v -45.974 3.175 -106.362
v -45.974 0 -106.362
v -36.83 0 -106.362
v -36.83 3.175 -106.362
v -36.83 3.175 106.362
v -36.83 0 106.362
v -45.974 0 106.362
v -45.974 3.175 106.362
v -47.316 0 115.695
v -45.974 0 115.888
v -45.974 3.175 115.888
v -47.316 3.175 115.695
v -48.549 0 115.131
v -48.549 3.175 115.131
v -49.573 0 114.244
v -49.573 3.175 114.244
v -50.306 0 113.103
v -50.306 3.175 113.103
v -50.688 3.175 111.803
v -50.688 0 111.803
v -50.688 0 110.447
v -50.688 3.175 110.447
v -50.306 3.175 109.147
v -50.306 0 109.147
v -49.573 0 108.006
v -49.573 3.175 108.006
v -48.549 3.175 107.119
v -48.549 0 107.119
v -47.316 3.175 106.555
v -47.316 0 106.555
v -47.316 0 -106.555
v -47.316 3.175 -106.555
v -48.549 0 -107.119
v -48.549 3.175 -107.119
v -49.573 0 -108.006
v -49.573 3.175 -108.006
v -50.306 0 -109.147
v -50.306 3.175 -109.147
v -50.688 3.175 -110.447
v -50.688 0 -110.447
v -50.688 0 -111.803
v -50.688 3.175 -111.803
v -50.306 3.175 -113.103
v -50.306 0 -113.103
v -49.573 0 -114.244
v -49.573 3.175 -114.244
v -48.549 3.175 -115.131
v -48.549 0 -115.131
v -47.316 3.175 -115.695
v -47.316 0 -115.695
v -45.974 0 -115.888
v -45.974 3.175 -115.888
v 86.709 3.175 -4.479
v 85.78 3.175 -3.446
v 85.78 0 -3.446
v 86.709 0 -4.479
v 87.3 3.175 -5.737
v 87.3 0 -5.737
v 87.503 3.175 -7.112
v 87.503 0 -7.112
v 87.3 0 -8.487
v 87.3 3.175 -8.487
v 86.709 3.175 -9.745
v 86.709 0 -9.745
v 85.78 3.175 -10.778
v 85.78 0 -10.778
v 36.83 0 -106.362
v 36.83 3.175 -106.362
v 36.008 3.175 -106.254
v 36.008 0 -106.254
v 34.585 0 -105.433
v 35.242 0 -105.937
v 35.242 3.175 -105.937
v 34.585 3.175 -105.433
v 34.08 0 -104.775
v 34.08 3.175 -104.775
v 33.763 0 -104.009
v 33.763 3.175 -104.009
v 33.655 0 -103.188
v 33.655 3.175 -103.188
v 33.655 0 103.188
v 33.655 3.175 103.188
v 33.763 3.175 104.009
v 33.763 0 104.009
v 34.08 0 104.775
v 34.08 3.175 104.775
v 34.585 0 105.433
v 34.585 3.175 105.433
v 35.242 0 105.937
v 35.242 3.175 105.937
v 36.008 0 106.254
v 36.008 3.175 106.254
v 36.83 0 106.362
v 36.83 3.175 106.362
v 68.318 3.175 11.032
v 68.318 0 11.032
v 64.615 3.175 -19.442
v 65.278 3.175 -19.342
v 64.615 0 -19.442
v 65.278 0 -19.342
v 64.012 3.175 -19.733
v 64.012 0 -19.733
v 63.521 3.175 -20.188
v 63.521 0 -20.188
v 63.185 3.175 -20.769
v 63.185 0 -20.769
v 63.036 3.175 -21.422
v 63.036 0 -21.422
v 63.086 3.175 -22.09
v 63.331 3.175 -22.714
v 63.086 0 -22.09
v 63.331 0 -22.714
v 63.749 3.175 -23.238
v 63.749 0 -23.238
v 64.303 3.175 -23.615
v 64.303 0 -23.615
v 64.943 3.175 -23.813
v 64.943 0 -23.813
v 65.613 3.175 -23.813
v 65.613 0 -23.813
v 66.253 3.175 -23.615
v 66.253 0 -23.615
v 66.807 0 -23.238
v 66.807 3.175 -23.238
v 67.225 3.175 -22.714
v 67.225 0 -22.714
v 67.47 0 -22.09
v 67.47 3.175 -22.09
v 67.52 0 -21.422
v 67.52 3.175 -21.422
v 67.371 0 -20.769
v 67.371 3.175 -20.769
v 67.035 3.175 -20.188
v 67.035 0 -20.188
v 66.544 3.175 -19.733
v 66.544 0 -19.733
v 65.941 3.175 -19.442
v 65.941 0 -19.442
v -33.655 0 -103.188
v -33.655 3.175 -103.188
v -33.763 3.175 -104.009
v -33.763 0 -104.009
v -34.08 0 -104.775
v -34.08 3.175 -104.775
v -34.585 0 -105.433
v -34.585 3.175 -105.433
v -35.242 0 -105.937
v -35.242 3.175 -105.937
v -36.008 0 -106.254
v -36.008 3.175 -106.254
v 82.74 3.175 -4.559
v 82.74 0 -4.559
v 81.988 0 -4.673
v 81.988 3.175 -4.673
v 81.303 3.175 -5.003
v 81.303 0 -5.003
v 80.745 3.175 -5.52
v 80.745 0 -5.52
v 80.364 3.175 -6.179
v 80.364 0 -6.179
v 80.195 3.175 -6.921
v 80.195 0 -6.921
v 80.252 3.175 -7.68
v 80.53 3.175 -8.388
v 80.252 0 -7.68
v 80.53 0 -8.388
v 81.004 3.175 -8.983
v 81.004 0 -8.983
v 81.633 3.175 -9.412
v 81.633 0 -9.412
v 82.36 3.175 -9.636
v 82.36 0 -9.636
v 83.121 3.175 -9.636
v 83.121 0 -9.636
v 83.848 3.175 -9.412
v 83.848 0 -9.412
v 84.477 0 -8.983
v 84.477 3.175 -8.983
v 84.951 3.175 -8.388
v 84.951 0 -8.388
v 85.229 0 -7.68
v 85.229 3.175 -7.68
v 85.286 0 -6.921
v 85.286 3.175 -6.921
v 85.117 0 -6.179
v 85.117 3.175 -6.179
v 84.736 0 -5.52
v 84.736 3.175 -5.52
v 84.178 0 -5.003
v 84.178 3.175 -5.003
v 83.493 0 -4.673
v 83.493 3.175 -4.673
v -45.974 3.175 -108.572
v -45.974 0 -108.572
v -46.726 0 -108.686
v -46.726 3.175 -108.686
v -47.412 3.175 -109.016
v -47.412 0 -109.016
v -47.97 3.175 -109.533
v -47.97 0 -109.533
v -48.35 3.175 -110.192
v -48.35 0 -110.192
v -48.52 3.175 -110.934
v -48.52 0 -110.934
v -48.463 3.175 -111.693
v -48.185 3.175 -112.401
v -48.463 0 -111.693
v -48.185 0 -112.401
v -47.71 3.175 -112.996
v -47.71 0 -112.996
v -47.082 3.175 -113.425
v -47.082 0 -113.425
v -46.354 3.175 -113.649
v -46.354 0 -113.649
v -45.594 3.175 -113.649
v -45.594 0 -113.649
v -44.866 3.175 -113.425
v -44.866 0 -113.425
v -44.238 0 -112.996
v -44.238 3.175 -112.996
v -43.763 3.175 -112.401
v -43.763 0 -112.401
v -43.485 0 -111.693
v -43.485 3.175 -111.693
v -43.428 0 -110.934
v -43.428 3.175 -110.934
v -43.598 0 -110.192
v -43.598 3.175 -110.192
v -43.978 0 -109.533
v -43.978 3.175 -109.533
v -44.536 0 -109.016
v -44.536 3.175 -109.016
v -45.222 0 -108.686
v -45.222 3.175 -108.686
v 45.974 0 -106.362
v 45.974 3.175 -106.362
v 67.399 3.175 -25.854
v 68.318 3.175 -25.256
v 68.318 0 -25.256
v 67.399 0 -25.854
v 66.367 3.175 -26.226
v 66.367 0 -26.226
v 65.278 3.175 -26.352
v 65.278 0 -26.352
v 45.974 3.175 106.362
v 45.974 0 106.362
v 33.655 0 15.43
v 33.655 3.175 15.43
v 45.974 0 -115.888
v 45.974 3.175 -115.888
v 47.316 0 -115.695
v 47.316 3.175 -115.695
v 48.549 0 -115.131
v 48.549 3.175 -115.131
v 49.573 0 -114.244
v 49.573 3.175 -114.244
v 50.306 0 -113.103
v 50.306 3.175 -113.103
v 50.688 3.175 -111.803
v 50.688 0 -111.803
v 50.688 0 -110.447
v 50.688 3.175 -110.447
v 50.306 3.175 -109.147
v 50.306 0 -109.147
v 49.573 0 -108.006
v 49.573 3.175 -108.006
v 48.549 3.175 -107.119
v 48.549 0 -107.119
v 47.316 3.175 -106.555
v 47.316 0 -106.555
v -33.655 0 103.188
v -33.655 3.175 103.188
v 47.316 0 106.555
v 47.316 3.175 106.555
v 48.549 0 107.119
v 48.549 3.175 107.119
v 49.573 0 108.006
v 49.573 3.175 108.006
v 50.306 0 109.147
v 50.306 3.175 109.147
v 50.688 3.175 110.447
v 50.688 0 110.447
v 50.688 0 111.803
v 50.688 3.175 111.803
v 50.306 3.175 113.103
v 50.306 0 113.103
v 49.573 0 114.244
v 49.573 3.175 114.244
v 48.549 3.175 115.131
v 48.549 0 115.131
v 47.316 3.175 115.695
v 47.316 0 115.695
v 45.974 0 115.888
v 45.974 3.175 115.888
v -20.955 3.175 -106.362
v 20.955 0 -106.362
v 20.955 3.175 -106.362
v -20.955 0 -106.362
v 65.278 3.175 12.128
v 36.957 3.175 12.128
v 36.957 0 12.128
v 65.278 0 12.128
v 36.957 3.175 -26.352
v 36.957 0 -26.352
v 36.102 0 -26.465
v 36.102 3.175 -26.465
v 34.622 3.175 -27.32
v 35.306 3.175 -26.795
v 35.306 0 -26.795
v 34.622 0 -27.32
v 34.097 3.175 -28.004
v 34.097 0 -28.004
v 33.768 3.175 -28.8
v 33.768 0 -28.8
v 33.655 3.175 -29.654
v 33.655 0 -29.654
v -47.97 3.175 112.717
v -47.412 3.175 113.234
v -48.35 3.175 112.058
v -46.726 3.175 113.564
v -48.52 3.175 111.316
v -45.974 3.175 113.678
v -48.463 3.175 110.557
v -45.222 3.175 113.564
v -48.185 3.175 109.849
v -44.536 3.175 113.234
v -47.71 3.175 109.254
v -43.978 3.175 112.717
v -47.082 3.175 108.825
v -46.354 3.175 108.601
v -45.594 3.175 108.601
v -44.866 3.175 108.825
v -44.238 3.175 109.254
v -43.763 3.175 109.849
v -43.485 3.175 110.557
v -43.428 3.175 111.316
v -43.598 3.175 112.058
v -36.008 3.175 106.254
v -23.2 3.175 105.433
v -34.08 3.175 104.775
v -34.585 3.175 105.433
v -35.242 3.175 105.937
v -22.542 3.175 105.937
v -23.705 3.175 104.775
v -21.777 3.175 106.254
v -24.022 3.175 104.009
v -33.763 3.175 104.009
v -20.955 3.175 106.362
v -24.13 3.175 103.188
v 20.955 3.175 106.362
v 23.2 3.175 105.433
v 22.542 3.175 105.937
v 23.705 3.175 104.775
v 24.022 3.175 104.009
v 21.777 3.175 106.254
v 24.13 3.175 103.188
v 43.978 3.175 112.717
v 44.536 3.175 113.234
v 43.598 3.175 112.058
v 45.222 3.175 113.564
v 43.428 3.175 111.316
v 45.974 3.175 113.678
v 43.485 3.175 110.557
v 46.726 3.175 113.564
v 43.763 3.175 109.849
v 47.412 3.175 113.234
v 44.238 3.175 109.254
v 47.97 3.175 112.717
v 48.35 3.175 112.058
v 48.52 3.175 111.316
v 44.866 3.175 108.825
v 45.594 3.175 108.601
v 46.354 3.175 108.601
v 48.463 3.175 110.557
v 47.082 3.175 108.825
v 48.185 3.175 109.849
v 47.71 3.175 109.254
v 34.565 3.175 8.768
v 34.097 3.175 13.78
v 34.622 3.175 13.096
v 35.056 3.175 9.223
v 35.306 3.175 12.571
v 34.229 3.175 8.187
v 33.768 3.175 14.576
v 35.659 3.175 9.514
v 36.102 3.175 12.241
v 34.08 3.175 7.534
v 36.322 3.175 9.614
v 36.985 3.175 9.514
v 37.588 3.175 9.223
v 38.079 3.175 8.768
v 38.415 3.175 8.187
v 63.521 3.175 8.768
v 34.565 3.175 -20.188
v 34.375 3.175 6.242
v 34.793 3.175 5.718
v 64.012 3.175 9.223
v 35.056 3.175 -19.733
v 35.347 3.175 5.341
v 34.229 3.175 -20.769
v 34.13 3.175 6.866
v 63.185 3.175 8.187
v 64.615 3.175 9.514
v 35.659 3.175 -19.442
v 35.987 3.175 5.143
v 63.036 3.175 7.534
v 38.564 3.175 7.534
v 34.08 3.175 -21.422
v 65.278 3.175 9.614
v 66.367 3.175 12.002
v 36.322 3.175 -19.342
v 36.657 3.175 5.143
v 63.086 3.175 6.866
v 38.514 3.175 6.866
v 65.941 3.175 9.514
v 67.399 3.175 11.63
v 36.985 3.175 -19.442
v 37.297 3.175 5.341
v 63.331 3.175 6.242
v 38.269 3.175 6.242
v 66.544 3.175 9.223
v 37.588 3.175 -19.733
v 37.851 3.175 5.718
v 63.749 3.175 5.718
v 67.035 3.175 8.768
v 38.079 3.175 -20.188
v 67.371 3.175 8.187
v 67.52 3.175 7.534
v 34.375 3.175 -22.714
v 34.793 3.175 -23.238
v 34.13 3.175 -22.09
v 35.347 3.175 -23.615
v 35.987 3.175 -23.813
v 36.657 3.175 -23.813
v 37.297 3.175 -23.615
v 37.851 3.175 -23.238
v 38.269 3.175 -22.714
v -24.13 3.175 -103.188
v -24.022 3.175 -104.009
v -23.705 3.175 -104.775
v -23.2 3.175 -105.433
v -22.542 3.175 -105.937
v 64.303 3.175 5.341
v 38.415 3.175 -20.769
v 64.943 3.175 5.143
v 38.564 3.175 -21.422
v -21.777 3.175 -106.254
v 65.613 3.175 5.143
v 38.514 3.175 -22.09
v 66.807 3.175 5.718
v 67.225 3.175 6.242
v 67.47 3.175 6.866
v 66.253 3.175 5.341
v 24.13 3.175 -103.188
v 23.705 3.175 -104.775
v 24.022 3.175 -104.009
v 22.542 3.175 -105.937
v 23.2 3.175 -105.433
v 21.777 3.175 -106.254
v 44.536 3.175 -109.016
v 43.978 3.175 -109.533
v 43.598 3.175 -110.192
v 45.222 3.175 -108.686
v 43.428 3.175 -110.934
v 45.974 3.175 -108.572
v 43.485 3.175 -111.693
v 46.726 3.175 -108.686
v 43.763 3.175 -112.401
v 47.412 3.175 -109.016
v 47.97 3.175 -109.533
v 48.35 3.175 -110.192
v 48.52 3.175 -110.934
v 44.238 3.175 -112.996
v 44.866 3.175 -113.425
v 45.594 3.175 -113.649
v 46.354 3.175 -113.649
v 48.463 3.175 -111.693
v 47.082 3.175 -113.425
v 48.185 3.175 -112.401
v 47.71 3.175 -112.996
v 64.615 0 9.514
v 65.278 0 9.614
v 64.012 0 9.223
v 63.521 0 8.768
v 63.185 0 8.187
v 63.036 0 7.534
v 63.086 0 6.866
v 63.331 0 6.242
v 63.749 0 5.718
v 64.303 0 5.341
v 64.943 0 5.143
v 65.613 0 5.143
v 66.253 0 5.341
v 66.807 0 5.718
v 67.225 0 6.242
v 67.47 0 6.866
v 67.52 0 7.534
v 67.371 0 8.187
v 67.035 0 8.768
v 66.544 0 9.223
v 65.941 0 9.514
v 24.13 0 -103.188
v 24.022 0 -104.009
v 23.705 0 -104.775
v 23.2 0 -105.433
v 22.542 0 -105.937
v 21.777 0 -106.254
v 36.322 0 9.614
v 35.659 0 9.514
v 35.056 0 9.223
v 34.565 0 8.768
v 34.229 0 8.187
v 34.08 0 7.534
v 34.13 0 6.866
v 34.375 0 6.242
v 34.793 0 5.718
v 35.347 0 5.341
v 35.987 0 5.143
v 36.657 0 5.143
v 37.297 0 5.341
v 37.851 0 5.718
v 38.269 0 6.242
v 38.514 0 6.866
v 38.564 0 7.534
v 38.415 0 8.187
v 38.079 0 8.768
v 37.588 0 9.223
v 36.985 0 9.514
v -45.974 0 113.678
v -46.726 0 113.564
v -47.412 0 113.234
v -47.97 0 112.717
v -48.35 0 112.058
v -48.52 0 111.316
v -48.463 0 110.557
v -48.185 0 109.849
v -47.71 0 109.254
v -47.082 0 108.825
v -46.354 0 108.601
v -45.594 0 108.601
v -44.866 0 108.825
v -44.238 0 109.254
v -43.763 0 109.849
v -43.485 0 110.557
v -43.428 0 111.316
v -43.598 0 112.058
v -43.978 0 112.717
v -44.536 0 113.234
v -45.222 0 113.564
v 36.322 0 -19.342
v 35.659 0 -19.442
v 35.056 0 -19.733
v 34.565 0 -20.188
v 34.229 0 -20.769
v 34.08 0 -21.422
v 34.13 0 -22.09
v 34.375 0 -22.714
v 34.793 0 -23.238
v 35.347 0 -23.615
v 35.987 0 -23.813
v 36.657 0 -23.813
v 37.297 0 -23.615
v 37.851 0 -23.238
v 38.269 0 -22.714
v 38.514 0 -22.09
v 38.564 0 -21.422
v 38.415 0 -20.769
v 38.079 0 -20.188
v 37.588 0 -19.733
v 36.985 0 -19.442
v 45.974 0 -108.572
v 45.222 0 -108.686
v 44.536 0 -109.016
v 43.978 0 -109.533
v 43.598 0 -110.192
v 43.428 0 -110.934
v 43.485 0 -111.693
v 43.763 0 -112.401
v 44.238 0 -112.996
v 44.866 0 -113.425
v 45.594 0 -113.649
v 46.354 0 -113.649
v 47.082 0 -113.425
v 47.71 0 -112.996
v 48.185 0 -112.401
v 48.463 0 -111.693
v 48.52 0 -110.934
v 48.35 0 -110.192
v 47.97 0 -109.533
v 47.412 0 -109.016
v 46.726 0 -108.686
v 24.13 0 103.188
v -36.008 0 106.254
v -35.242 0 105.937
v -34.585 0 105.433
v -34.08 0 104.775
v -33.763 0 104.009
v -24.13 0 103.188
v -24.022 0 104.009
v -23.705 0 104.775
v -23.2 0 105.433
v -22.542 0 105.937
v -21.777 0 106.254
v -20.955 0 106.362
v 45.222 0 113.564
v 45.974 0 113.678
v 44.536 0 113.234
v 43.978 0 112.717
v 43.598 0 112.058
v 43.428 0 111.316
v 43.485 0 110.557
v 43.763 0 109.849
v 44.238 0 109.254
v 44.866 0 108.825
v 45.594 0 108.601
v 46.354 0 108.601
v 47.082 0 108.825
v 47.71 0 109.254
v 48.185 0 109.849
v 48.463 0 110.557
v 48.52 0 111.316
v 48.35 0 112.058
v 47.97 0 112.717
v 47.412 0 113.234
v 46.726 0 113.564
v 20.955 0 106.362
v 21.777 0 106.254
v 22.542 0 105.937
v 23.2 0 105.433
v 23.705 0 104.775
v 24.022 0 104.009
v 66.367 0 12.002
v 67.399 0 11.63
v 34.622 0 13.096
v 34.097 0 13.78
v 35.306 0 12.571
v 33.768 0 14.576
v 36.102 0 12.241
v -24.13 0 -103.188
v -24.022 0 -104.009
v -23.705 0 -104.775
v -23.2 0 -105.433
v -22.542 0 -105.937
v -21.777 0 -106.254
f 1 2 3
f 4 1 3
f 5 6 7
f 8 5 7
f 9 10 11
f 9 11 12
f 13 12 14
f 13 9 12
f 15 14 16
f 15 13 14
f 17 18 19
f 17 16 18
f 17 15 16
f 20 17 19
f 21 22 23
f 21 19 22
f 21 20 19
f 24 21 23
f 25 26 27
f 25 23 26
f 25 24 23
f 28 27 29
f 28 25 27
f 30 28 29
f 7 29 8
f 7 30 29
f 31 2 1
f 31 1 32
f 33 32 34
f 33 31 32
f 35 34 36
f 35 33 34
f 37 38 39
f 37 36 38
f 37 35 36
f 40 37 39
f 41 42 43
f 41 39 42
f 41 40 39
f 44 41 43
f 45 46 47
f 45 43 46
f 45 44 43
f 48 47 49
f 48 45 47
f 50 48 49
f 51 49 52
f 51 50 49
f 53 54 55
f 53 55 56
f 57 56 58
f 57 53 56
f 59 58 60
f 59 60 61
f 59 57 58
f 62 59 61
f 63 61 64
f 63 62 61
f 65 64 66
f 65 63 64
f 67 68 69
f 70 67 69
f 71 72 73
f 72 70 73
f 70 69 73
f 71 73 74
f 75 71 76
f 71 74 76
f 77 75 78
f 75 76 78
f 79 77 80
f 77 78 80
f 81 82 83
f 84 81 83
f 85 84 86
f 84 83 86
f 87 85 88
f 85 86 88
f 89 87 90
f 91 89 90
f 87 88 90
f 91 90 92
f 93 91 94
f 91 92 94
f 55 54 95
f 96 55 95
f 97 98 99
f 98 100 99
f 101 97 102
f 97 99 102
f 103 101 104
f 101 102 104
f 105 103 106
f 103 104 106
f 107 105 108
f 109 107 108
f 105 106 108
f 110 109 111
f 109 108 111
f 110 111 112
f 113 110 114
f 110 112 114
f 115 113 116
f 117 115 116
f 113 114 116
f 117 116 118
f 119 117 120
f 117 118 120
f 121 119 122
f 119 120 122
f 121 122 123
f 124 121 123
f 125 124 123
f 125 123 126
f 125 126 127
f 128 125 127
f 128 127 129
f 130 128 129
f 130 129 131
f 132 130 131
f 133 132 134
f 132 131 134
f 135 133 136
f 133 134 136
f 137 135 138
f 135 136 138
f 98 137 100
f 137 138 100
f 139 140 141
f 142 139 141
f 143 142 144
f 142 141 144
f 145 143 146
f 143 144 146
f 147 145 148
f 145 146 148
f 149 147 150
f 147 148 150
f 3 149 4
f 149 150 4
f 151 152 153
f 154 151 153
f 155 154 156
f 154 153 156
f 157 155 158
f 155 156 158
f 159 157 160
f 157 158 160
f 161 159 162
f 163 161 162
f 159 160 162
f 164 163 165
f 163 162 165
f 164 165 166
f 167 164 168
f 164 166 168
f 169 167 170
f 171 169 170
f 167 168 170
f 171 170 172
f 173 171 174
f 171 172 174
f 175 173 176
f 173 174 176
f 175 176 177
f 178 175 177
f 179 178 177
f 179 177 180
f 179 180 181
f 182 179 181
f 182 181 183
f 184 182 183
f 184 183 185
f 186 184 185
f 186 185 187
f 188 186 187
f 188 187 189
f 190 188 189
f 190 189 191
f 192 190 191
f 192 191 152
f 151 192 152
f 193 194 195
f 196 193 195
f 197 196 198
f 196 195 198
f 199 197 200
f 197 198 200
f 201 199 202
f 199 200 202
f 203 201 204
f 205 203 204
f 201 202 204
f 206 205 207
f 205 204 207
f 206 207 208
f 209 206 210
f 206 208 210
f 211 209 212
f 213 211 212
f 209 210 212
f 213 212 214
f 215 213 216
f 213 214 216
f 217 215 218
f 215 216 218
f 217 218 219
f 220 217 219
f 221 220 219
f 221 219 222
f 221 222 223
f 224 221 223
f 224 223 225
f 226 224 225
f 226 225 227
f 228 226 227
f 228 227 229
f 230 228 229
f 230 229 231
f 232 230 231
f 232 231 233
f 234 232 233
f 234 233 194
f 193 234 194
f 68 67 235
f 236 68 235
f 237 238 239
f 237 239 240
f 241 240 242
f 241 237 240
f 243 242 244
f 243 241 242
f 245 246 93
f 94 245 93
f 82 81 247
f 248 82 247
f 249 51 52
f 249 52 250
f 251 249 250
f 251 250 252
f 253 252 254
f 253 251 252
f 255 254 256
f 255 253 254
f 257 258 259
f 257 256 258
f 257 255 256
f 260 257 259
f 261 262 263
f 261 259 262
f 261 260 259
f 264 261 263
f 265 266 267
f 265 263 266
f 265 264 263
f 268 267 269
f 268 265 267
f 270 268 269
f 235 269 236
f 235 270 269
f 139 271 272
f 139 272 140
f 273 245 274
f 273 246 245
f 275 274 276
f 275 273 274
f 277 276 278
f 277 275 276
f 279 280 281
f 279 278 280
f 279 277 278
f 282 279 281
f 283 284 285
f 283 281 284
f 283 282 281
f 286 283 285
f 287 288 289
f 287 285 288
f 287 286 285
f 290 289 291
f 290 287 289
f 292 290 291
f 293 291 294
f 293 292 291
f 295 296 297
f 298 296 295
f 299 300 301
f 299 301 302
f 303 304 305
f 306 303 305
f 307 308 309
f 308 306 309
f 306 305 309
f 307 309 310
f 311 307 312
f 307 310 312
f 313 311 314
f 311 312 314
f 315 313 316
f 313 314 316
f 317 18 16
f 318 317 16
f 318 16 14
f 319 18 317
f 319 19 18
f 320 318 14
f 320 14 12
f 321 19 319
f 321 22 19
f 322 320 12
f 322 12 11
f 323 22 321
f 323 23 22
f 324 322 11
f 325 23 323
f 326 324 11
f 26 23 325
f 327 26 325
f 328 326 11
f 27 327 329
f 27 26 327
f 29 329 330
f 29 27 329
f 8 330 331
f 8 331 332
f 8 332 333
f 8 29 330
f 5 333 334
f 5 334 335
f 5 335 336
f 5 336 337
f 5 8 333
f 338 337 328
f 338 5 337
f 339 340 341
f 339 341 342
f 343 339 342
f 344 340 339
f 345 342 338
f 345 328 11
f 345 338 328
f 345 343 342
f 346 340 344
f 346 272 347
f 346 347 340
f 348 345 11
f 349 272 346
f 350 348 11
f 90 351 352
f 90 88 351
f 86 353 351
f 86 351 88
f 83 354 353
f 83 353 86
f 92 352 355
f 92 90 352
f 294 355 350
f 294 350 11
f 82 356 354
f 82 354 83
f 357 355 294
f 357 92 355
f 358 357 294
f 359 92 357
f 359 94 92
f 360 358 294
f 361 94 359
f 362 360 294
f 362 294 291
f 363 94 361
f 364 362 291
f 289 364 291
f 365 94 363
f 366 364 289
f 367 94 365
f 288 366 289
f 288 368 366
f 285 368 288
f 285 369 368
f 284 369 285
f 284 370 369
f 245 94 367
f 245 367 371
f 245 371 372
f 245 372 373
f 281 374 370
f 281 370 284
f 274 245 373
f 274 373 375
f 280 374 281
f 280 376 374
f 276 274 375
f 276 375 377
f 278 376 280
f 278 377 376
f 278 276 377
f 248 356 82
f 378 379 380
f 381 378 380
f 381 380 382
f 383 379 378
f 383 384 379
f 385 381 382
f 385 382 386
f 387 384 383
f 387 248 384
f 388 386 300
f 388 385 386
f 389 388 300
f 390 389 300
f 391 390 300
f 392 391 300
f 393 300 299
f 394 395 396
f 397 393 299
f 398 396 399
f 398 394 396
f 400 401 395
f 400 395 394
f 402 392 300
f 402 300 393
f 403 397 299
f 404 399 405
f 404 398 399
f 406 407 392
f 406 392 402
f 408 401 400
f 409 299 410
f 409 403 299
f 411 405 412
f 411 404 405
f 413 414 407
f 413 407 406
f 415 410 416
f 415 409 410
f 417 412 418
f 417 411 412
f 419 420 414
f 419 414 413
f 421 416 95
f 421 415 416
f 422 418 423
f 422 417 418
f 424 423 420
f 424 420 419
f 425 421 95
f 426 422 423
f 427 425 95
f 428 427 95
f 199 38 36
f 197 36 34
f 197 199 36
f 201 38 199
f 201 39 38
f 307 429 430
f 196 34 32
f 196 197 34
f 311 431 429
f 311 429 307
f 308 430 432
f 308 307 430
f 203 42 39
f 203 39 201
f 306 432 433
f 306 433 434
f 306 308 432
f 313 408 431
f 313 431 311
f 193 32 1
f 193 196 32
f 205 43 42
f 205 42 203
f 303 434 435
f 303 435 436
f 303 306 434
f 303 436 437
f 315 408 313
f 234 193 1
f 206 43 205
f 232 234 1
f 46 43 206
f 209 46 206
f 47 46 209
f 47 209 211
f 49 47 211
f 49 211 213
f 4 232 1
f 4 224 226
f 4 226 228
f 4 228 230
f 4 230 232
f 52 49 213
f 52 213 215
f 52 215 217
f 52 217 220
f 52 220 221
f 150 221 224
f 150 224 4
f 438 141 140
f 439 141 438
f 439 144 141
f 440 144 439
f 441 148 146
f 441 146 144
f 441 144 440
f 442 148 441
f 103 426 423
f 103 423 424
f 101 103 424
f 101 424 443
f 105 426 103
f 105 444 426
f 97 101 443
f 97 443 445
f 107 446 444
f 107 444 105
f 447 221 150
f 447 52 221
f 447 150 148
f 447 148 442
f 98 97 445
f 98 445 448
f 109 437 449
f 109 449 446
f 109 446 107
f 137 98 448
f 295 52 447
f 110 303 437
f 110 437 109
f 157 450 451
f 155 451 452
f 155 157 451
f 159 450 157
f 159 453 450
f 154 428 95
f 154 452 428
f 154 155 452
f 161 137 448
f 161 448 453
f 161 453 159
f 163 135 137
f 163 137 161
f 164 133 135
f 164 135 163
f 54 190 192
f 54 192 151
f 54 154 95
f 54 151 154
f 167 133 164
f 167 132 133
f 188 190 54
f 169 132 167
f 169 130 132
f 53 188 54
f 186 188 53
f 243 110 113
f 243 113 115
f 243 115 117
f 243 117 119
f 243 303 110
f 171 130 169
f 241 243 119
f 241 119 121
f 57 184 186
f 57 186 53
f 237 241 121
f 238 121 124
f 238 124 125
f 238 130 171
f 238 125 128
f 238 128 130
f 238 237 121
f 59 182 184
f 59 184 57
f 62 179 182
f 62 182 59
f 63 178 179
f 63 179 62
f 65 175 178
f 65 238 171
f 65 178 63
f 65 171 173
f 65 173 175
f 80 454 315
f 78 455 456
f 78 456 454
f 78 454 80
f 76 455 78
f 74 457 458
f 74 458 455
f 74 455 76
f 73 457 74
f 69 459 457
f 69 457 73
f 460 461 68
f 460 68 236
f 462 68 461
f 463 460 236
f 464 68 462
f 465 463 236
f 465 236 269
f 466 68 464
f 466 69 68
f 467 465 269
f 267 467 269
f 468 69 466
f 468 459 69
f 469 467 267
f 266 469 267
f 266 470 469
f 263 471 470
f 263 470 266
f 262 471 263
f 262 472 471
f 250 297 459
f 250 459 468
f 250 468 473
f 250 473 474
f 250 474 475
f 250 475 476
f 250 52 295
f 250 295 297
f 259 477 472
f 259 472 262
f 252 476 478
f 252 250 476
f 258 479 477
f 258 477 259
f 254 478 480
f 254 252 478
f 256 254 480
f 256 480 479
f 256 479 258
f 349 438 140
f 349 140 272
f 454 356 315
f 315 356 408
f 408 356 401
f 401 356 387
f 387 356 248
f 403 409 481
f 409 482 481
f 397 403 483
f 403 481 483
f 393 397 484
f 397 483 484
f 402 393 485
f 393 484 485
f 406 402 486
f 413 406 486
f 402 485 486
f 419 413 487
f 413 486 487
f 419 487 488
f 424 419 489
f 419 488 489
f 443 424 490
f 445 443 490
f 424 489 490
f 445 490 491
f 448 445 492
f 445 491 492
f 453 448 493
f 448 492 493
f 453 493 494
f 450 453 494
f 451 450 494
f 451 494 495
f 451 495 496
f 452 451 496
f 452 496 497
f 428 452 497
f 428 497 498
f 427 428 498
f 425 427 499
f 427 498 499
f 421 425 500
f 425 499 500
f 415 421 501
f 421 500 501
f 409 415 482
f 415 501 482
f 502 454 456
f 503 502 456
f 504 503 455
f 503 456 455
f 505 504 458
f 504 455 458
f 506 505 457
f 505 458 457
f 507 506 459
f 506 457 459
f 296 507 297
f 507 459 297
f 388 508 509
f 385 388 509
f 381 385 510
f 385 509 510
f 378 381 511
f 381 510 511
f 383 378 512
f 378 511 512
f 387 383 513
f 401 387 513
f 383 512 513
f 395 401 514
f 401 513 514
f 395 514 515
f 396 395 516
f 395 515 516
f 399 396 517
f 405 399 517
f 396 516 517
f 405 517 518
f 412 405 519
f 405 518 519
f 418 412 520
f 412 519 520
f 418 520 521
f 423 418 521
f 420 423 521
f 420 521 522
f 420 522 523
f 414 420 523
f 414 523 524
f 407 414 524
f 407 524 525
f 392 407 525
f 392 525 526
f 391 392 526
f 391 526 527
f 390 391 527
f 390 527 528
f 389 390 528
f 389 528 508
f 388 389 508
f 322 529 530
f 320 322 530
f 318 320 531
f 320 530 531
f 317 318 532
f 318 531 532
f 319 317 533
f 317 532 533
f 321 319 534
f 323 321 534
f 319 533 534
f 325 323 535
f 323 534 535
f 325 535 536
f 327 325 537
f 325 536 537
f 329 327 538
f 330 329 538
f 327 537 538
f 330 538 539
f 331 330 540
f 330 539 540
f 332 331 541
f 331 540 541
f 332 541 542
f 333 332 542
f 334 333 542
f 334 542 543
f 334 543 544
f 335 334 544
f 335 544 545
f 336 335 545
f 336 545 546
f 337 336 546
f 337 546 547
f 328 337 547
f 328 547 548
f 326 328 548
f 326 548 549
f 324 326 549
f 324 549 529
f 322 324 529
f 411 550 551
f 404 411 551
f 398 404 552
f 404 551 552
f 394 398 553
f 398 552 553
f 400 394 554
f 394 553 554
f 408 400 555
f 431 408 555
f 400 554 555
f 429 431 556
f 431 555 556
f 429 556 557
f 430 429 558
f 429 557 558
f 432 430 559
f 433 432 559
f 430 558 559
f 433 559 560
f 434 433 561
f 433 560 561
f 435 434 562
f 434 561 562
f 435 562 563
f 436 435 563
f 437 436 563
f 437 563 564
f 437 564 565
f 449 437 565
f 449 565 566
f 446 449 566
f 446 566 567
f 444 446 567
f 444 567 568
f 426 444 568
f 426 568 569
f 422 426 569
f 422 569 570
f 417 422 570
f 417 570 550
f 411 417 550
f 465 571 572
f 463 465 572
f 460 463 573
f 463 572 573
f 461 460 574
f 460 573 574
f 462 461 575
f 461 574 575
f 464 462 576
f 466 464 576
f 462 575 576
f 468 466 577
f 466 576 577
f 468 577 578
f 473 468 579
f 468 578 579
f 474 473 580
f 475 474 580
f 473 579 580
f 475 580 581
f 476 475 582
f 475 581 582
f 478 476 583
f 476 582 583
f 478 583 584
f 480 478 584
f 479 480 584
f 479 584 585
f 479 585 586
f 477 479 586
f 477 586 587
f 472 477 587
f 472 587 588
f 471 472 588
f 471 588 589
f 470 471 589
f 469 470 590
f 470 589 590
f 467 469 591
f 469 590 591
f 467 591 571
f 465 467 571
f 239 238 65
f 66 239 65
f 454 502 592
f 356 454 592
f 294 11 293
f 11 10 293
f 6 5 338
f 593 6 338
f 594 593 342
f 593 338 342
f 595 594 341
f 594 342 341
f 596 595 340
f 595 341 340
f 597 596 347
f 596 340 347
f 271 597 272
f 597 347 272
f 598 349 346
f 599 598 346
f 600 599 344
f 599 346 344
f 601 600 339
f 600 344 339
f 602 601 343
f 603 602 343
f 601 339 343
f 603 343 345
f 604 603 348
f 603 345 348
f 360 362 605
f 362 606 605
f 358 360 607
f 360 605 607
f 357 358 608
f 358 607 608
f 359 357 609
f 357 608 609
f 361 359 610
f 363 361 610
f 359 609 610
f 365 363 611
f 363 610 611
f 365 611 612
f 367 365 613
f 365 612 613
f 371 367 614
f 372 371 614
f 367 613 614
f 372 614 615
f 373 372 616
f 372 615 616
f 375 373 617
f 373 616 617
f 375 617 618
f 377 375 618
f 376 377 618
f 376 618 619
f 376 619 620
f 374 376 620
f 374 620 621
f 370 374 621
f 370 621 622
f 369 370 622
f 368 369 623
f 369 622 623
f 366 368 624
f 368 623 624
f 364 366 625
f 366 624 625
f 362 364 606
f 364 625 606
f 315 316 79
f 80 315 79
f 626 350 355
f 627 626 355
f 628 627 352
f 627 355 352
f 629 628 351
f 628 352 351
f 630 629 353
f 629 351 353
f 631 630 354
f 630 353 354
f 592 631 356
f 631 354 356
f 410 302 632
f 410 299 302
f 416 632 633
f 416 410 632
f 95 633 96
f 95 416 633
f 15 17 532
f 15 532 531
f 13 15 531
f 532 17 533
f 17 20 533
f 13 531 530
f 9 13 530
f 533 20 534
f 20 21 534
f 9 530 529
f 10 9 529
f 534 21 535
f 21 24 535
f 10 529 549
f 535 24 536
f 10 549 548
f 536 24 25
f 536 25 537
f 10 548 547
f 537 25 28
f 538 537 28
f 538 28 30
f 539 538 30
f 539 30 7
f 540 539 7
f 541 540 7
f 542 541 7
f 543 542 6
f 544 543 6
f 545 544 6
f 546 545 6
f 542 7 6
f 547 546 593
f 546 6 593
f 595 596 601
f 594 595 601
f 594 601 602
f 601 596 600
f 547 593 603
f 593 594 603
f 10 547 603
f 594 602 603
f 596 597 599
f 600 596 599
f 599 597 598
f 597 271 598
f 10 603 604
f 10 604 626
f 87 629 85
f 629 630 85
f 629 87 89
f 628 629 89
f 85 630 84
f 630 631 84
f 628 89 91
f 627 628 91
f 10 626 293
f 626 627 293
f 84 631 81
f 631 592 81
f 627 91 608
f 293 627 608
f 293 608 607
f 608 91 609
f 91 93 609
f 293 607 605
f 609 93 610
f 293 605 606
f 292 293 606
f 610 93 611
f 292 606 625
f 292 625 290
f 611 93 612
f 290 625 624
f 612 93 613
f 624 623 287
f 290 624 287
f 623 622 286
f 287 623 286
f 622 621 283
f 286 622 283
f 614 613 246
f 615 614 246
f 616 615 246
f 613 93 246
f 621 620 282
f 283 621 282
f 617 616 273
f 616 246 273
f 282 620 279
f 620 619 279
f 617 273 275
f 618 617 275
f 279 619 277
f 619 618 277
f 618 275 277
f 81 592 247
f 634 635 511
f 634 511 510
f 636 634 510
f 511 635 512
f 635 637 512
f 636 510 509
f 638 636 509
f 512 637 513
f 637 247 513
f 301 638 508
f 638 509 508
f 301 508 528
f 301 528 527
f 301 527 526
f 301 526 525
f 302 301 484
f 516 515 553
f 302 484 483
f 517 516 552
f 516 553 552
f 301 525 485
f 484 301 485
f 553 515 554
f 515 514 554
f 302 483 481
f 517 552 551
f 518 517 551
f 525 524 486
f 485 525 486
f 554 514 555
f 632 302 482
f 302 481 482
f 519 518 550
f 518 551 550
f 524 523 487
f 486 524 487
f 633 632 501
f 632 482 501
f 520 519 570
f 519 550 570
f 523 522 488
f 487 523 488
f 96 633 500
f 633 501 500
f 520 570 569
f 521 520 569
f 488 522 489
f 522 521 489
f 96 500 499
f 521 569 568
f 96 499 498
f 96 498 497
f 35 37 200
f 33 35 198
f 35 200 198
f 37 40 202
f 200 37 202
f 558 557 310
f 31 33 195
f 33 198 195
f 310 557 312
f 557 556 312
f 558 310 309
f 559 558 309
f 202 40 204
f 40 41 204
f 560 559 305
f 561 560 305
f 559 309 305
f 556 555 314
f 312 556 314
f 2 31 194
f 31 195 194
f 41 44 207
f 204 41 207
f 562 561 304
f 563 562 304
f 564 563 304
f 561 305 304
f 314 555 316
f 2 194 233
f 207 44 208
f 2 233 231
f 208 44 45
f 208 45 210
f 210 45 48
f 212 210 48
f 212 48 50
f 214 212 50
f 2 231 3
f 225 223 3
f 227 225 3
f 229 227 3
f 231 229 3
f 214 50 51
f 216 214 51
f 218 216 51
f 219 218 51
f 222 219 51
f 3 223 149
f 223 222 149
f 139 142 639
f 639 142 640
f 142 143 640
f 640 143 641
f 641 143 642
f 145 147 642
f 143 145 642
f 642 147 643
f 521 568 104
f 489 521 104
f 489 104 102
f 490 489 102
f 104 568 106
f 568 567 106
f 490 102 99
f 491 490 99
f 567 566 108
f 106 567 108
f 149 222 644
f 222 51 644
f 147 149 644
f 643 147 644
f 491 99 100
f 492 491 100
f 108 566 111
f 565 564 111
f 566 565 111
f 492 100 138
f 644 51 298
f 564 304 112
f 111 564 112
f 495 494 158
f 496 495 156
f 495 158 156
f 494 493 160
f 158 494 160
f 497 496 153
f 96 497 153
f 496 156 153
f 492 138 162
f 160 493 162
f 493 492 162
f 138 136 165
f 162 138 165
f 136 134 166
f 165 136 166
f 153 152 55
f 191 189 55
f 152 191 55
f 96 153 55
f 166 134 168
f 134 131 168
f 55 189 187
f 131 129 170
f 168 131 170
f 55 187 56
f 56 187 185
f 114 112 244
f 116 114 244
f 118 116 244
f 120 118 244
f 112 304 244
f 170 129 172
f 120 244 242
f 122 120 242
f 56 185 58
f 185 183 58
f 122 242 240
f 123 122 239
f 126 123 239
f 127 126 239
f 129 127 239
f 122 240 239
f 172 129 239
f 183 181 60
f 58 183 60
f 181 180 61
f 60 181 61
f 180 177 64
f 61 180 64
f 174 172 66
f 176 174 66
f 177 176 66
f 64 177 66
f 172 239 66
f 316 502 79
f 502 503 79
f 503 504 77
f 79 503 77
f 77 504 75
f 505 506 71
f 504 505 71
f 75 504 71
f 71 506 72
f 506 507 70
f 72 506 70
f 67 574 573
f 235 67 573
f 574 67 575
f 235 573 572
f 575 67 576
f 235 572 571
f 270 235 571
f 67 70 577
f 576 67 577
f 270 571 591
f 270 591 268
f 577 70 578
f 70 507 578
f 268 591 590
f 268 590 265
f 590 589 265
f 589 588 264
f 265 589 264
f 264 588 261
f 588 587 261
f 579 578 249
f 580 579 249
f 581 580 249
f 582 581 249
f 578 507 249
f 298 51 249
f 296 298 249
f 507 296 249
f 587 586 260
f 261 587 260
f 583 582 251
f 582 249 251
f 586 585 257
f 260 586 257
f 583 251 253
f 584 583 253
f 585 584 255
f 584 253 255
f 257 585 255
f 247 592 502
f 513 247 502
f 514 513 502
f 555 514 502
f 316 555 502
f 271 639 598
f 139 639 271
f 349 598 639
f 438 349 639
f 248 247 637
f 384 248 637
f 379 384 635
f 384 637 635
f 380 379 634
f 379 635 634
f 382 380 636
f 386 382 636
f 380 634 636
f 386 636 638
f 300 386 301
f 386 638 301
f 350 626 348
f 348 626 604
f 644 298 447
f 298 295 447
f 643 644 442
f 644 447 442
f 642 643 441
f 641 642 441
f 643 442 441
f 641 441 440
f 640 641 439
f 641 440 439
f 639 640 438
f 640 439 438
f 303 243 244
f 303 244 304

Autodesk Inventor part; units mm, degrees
ref_plane "YZ Plane" through (0, 0, 0) normal (1, 0, 0) x (0, 1, 0)
ref_plane "XZ Plane" through (0, 0, 0) normal (0, 1, 0) x (-1, 0, 0)
ref_plane "XY Plane" through (0, 0, 0) normal (0, 0, 1) x (1, 0, 0)
sketch "Sketch1" plane through (0, 0, 0) normal (0, 1, 0) x (-1, 0, 0)
  line L0 (45.974, 111.125) -> (-45.974, 111.125) construction
  line L1 (45.974, 115.8875) -> (-45.974, 115.8875)
  line L2 (-45.974, 106.3625) -> (45.974, 106.3625)
  arc A0 (45.974, 106.3625) -> (45.974, 115.8875) centre (45.974, 111.125) ccw
  arc A1 (-45.974, 115.8875) -> (-45.974, 106.3625) centre (-45.974, 111.125) ccw
  line L3 (0, 111.125) -> (0, -111.125) construction
  line L4 (45.974, -111.125) -> (-45.974, -111.125) construction
  line L5 (45.974, -115.8875) -> (-45.974, -115.8875)
  line L6 (-45.974, -106.3625) -> (45.974, -106.3625) construction
  arc A2 (45.974, -115.8875) -> (45.974, -106.3625) centre (45.974, -111.125) ccw
  arc A3 (-45.974, -106.3625) -> (-45.974, -115.8875) centre (-45.974, -111.125) ccw
  line L7 (24.13, 106.3625) -> (24.13, -106.3625)
  line L8 (-24.13, 106.3625) -> (-24.13, -106.3625) construction
  line L9 (24.13, 0) -> (-24.13, 0) construction
  line L10 (33.655, 106.3625) -> (33.655, -106.3625)
  line L11 (-33.655, 106.3625) -> (-33.655, -106.3625)
  line L12 (45.974, -106.3625) -> (33.655, -106.3625)
  line L13 (-24.13, -106.3625) -> (24.13, -106.3625)
  line L14 (-24.13, -106.3625) -> (-24.13, 106.3625)
  line L15 (-33.655, -106.3625) -> (-45.974, -106.3625)
  line L16 (14.478, 14.478) -> (-14.478, -14.478) construction
  circle A4 centre (14.478, 14.478) radius 4.7625 construction
  circle A5 centre (-14.478, -14.478) radius 4.7625 construction
  line L17 (11.1788, 17.9127) -> (24.13, 30.353)
  line L18 (11.1788, 11.0433) -> (24.13, -1.397)
  line L19 (-11.1788, -17.9127) -> (-24.13, -30.353)
  line L20 (-11.1788, -11.0433) -> (-24.13, 1.397)
  arc A6 (11.1788, 17.9127) -> (11.1788, 11.0433) centre (14.478, 14.478) ccw
  arc A7 (-11.1788, -17.9127) -> (-11.1788, -11.0433) centre (-14.478, -14.478) ccw
  point P0 (0, 0)
  point P1 (0, 0)
  point P2 (0, 0)
  point P3 (-33.655, 106.3625)
  point P4 (33.655, 106.3625)
  point P5 (0, 0)
  dimension "d0" = 9.525
  dimension "d1" = 91.948
  dimension "d2" = 222.25
  dimension "d4" = 9.525
  dimension "d5" = 48.26
  dimension "d6" = 9.525
  dimension "d7" = 9.525
  dimension "d33" = 28.956
  dimension "d34" = 28.956
  dimension "d35" = 9.525
  dimension "d36" = 9.525
  dimension "d37" = 15.875
  dimension "d38" = 15.875
  dimension "d39" = 15.875
  dimension "d40" = 15.875
extrude "Extrusion1" add sketch "Sketch1" along normal blind 3.175 contours A0 L2 A1 L1 | L10 L12 A2 L5 A3 L15 L11 L2 L14 L13 L7
sketch "Sketch2" plane through (0, 3.175, 0) normal (0, 1, 0) x (1, 0, 0)
  line L0 (-33.655, -106.3625) -> (-45.974, -106.3625) construction
  arc A0 (-45.974, -106.3625) -> (-45.974, -115.8875) centre (-45.974, -111.125) ccw construction
  line L1 (-45.974, -115.8875) -> (45.974, -115.8875) construction
  arc A1 (45.974, -115.8875) -> (45.974, -106.3625) centre (45.974, -111.125) ccw construction
  line L2 (-24.13, -106.3625) -> (-24.13, 106.3625) projected
  line L3 (-24.13, 106.3625) -> (24.13, 106.3625) projected
  line L4 (24.13, 106.3625) -> (24.13, -106.3625) projected
  line L5 (24.13, -106.3625) -> (-24.13, -106.3625) projected
  line L6 (45.974, -106.3625) -> (33.655, -106.3625) projected
  line L7 (33.655, -106.3625) -> (33.655, 106.3625) projected
  line L8 (33.655, 106.3625) -> (45.974, 106.3625) projected
  arc A2 (45.974, 106.3625) -> (45.974, 115.8875) centre (45.974, 111.125) ccw projected
  line L9 (45.974, 115.8875) -> (-45.974, 115.8875) projected
  arc A3 (-45.974, 115.8875) -> (-45.974, 106.3625) centre (-45.974, 111.125) ccw projected
  line L10 (-45.974, 106.3625) -> (-33.655, 106.3625) projected
  line L11 (-33.655, 106.3625) -> (-33.655, -106.3625) projected
  point P0 (0, 0)
  point P1 (45.974, 111.125)
  point P2 (-45.974, 111.125)
  point P3 (-14.478, 71.0565)
  point P4 (14.478, 100.0125)
hole "Hole1" at (-45.974, 3.175, 111.125) at (45.974, 3.175, 111.125) at (45.974, 3.175, -111.125) at (-45.974, 3.175, -111.125) direction (0, -1, 0) diameter 5.1054 end through all clearance for "Flat Head Machine Screw (82)" size "#10" standard "Ansi Unified Screw Threads"
sketch "Sketch3" plane through (0, 3.175, 0) normal (0, 1, 0) x (1, 0, 0)
  circle A0 centre (45.974, 111.125) radius 2.5527 construction
  circle A1 centre (-45.974, -111.125) radius 2.5527 construction
  circle A2 centre (45.974, -111.125) radius 2.5527 construction
  circle A3 centre (-45.974, 111.125) radius 2.5527 construction
  line L0 (-24.13, -106.3625) -> (24.13, -106.3625) construction
  line L1 (24.13, -106.3625) -> (24.13, 106.3625) construction
  line L2 (24.13, 106.3625) -> (-24.13, 106.3625) construction
  line L3 (-24.13, 106.3625) -> (-24.13, -106.3625) construction
  line L4 (-33.655, -106.3625) -> (-33.655, 106.3625) construction
  line L5 (-33.655, 106.3625) -> (-45.974, 106.3625) construction
  arc A4 (-45.974, 115.8875) -> (-45.974, 106.3625) centre (-45.974, 111.125) ccw construction
  line L6 (-45.974, 115.8875) -> (45.974, 115.8875) construction
  arc A5 (45.974, 106.3625) -> (45.974, 115.8875) centre (45.974, 111.125) ccw construction
  line L7 (45.974, 106.3625) -> (33.655, 106.3625) construction
  line L8 (33.655, 106.3625) -> (33.655, -106.3625) construction
  line L9 (33.655, -106.3625) -> (45.974, -106.3625) construction
  arc A6 (45.974, -115.8875) -> (45.974, -106.3625) centre (45.974, -111.125) ccw construction
  line L10 (45.974, -115.8875) -> (-45.974, -115.8875) construction
  arc A7 (-45.974, -106.3625) -> (-45.974, -115.8875) centre (-45.974, -111.125) ccw construction
  line L11 (-45.974, -106.3625) -> (-33.655, -106.3625) construction
  line L12 (65.278, -7.366) -> (36.322, 21.59) construction
  circle A8 centre (65.278, -7.366) radius 4.7625 construction
  circle A9 centre (36.322, 21.59) radius 4.7625 construction
  line L13 (33.655, -106.3625) -> (33.655, 106.3625) construction
  circle A10 centre (36.322, -7.366) radius 4.7625 construction
  circle A11 centre (65.278, 21.59) radius 4.7625 construction
  line L14 (33.655, -12.1285) -> (65.278, -12.1285)
  line L15 (70.0405, -7.366) -> (70.0405, 21.59)
  line L16 (65.278, 26.3525) -> (33.655, 26.3525)
  arc A12 (65.278, -12.1285) -> (70.0405, -7.366) centre (65.278, -7.366) ccw
  arc A13 (70.0405, 21.59) -> (65.278, 26.3525) centre (65.278, 21.59) ccw
  line L17 (33.655, -12.1285) -> (33.655, 26.3525)
  point P0 (0, 0)
  point P1 (50.8, 7.112)
  dimension "d48" = 31.623
  dimension "d50" = 28.956
  dimension "d51" = 9.525
  dimension "d66" = 7.112
  dimension "d67" = 28.956
extrude "Extrusion2" add sketch "Sketch3" against normal blind 3.175
fillet "Fillet2" radius 3.302 2 edges at (33.655, 1.5875, 12.1285) (33.655, 1.5875, -26.3525)
hole "Hole4" at (65.278, 3.175, 7.366) at (36.322, 3.175, -21.59) at (36.322, 3.175, 7.366) at (65.278, 3.175, -21.59) direction (0, -1, 0) diameter 4.4958 end through all clearance for "Flat Head Machine Screw (82)" size "#8" standard "Ansi Unified Screw Threads"
sketch "Sketch5" plane through (0, 3.175, 0) normal (0, 1, 0) x (1, 0, 0)
  circle A0 centre (82.7405, 7.112) radius 4.7625 construction
  circle A1 centre (36.322, -7.366) radius 2.2479 construction
  circle A2 centre (65.278, -7.366) radius 2.2479 construction
  circle A3 centre (36.322, 21.59) radius 2.2479 construction
  circle A4 centre (65.278, 21.59) radius 2.2479 construction
  circle A5 centre (45.974, 111.125) radius 2.5527 construction
  circle A6 centre (-45.974, -111.125) radius 2.5527 construction
  circle A7 centre (45.974, -111.125) radius 2.5527 construction
  circle A8 centre (-45.974, 111.125) radius 2.5527 construction
  line L0 (-24.13, -106.3625) -> (24.13, -106.3625) construction
  line L1 (24.13, -106.3625) -> (24.13, 106.3625) construction
  line L2 (24.13, 106.3625) -> (-24.13, 106.3625) construction
  line L3 (-24.13, 106.3625) -> (-24.13, -106.3625) construction
  line L4 (-33.655, -106.3625) -> (-33.655, 106.3625) construction
  line L5 (-33.655, 106.3625) -> (-45.974, 106.3625) construction
  arc A9 (-45.974, 115.8875) -> (-45.974, 106.3625) centre (-45.974, 111.125) ccw construction
  line L6 (-45.974, 115.8875) -> (45.974, 115.8875) construction
  arc A10 (45.974, 106.3625) -> (45.974, 115.8875) centre (45.974, 111.125) ccw construction
  line L7 (45.974, 106.3625) -> (33.655, 106.3625) construction
  line L8 (33.655, 106.3625) -> (33.655, 29.6545) construction
  arc A11 (33.655, 29.6545) -> (36.957, 26.3525) centre (36.957, 29.6545) ccw construction
  line L9 (36.957, 26.3525) -> (65.278, 26.3525) construction
  arc A12 (70.0405, 21.59) -> (65.278, 26.3525) centre (65.278, 21.59) ccw construction
  line L10 (70.0405, 21.59) -> (70.0405, -7.366) construction
  arc A13 (65.278, -12.1285) -> (70.0405, -7.366) centre (65.278, -7.366) ccw construction
  line L11 (65.278, -12.1285) -> (36.957, -12.1285) construction
  arc A14 (36.957, -12.1285) -> (33.655, -15.4305) centre (36.957, -15.4305) ccw construction
  line L12 (33.655, -15.4305) -> (33.655, -106.3625) construction
  line L13 (33.655, -106.3625) -> (45.974, -106.3625) construction
  arc A15 (45.974, -115.8875) -> (45.974, -106.3625) centre (45.974, -111.125) ccw construction
  line L14 (45.974, -115.8875) -> (-45.974, -115.8875) construction
  arc A16 (-45.974, -106.3625) -> (-45.974, -115.8875) centre (-45.974, -111.125) ccw construction
  line L15 (-45.974, -106.3625) -> (-33.655, -106.3625) construction
  arc A17 (70.0405, 21.59) -> (65.278, 26.3525) centre (65.278, 21.59) ccw construction
  line L16 (68.3177, 25.2563) -> (85.7802, 10.7783)
  line L17 (85.7802, 3.4457) -> (68.3177, -11.0323)
  arc A18 (85.7802, 3.4457) -> (85.7802, 10.7783) centre (82.7405, 7.112) ccw
  line L18 (70.0405, 21.59) -> (70.0405, -7.366)
  arc A19 (70.0405, 21.59) -> (68.3177, 25.2563) centre (65.278, 21.59) ccw
  arc A20 (65.278, -12.1285) -> (70.0405, -7.366) centre (65.278, -7.366) ccw construction
  arc A21 (68.3177, -11.0323) -> (70.0405, -7.366) centre (65.278, -7.366) ccw
  point P0 (0, 0)
  point P1 (70.0405, 7.112)
  point P2 (70.0405, -7.366)
  dimension "d76" = 9.525
  dimension "d77" = 12.7
extrude "Extrusion3" add sketch "Sketch5" against normal up to surface (3.175 mm away)
hole "Hole6" at (82.7405, 3.175, -7.112) direction (0, -1, 0) diameter 5.1054 end through all clearance for "Flat Head Machine Screw (82)" size "#10" standard "Ansi Unified Screw Threads"
fillet "Fillet3" radius 3.175 8 edges at (-24.13, 1.5875, -106.3625) (24.13, 1.5875, -106.3625) (-33.655, 1.5875, -106.3625) (33.655, 1.5875, -106.3625) (-33.655, 1.5875, 106.3625) (-24.13, 1.5875, 106.3625) (24.13, 1.5875, 106.3625) (33.655, 1.5875, 106.3625)
equation "\"d4\" = d0"
equation "\"d6\" = d7"
equation "\"d38\" = d37"
equation "\"d39\" = d37"
equation "\"d40\" = d39"
properties part number "DB1-007" material "Aluminum 6061"
